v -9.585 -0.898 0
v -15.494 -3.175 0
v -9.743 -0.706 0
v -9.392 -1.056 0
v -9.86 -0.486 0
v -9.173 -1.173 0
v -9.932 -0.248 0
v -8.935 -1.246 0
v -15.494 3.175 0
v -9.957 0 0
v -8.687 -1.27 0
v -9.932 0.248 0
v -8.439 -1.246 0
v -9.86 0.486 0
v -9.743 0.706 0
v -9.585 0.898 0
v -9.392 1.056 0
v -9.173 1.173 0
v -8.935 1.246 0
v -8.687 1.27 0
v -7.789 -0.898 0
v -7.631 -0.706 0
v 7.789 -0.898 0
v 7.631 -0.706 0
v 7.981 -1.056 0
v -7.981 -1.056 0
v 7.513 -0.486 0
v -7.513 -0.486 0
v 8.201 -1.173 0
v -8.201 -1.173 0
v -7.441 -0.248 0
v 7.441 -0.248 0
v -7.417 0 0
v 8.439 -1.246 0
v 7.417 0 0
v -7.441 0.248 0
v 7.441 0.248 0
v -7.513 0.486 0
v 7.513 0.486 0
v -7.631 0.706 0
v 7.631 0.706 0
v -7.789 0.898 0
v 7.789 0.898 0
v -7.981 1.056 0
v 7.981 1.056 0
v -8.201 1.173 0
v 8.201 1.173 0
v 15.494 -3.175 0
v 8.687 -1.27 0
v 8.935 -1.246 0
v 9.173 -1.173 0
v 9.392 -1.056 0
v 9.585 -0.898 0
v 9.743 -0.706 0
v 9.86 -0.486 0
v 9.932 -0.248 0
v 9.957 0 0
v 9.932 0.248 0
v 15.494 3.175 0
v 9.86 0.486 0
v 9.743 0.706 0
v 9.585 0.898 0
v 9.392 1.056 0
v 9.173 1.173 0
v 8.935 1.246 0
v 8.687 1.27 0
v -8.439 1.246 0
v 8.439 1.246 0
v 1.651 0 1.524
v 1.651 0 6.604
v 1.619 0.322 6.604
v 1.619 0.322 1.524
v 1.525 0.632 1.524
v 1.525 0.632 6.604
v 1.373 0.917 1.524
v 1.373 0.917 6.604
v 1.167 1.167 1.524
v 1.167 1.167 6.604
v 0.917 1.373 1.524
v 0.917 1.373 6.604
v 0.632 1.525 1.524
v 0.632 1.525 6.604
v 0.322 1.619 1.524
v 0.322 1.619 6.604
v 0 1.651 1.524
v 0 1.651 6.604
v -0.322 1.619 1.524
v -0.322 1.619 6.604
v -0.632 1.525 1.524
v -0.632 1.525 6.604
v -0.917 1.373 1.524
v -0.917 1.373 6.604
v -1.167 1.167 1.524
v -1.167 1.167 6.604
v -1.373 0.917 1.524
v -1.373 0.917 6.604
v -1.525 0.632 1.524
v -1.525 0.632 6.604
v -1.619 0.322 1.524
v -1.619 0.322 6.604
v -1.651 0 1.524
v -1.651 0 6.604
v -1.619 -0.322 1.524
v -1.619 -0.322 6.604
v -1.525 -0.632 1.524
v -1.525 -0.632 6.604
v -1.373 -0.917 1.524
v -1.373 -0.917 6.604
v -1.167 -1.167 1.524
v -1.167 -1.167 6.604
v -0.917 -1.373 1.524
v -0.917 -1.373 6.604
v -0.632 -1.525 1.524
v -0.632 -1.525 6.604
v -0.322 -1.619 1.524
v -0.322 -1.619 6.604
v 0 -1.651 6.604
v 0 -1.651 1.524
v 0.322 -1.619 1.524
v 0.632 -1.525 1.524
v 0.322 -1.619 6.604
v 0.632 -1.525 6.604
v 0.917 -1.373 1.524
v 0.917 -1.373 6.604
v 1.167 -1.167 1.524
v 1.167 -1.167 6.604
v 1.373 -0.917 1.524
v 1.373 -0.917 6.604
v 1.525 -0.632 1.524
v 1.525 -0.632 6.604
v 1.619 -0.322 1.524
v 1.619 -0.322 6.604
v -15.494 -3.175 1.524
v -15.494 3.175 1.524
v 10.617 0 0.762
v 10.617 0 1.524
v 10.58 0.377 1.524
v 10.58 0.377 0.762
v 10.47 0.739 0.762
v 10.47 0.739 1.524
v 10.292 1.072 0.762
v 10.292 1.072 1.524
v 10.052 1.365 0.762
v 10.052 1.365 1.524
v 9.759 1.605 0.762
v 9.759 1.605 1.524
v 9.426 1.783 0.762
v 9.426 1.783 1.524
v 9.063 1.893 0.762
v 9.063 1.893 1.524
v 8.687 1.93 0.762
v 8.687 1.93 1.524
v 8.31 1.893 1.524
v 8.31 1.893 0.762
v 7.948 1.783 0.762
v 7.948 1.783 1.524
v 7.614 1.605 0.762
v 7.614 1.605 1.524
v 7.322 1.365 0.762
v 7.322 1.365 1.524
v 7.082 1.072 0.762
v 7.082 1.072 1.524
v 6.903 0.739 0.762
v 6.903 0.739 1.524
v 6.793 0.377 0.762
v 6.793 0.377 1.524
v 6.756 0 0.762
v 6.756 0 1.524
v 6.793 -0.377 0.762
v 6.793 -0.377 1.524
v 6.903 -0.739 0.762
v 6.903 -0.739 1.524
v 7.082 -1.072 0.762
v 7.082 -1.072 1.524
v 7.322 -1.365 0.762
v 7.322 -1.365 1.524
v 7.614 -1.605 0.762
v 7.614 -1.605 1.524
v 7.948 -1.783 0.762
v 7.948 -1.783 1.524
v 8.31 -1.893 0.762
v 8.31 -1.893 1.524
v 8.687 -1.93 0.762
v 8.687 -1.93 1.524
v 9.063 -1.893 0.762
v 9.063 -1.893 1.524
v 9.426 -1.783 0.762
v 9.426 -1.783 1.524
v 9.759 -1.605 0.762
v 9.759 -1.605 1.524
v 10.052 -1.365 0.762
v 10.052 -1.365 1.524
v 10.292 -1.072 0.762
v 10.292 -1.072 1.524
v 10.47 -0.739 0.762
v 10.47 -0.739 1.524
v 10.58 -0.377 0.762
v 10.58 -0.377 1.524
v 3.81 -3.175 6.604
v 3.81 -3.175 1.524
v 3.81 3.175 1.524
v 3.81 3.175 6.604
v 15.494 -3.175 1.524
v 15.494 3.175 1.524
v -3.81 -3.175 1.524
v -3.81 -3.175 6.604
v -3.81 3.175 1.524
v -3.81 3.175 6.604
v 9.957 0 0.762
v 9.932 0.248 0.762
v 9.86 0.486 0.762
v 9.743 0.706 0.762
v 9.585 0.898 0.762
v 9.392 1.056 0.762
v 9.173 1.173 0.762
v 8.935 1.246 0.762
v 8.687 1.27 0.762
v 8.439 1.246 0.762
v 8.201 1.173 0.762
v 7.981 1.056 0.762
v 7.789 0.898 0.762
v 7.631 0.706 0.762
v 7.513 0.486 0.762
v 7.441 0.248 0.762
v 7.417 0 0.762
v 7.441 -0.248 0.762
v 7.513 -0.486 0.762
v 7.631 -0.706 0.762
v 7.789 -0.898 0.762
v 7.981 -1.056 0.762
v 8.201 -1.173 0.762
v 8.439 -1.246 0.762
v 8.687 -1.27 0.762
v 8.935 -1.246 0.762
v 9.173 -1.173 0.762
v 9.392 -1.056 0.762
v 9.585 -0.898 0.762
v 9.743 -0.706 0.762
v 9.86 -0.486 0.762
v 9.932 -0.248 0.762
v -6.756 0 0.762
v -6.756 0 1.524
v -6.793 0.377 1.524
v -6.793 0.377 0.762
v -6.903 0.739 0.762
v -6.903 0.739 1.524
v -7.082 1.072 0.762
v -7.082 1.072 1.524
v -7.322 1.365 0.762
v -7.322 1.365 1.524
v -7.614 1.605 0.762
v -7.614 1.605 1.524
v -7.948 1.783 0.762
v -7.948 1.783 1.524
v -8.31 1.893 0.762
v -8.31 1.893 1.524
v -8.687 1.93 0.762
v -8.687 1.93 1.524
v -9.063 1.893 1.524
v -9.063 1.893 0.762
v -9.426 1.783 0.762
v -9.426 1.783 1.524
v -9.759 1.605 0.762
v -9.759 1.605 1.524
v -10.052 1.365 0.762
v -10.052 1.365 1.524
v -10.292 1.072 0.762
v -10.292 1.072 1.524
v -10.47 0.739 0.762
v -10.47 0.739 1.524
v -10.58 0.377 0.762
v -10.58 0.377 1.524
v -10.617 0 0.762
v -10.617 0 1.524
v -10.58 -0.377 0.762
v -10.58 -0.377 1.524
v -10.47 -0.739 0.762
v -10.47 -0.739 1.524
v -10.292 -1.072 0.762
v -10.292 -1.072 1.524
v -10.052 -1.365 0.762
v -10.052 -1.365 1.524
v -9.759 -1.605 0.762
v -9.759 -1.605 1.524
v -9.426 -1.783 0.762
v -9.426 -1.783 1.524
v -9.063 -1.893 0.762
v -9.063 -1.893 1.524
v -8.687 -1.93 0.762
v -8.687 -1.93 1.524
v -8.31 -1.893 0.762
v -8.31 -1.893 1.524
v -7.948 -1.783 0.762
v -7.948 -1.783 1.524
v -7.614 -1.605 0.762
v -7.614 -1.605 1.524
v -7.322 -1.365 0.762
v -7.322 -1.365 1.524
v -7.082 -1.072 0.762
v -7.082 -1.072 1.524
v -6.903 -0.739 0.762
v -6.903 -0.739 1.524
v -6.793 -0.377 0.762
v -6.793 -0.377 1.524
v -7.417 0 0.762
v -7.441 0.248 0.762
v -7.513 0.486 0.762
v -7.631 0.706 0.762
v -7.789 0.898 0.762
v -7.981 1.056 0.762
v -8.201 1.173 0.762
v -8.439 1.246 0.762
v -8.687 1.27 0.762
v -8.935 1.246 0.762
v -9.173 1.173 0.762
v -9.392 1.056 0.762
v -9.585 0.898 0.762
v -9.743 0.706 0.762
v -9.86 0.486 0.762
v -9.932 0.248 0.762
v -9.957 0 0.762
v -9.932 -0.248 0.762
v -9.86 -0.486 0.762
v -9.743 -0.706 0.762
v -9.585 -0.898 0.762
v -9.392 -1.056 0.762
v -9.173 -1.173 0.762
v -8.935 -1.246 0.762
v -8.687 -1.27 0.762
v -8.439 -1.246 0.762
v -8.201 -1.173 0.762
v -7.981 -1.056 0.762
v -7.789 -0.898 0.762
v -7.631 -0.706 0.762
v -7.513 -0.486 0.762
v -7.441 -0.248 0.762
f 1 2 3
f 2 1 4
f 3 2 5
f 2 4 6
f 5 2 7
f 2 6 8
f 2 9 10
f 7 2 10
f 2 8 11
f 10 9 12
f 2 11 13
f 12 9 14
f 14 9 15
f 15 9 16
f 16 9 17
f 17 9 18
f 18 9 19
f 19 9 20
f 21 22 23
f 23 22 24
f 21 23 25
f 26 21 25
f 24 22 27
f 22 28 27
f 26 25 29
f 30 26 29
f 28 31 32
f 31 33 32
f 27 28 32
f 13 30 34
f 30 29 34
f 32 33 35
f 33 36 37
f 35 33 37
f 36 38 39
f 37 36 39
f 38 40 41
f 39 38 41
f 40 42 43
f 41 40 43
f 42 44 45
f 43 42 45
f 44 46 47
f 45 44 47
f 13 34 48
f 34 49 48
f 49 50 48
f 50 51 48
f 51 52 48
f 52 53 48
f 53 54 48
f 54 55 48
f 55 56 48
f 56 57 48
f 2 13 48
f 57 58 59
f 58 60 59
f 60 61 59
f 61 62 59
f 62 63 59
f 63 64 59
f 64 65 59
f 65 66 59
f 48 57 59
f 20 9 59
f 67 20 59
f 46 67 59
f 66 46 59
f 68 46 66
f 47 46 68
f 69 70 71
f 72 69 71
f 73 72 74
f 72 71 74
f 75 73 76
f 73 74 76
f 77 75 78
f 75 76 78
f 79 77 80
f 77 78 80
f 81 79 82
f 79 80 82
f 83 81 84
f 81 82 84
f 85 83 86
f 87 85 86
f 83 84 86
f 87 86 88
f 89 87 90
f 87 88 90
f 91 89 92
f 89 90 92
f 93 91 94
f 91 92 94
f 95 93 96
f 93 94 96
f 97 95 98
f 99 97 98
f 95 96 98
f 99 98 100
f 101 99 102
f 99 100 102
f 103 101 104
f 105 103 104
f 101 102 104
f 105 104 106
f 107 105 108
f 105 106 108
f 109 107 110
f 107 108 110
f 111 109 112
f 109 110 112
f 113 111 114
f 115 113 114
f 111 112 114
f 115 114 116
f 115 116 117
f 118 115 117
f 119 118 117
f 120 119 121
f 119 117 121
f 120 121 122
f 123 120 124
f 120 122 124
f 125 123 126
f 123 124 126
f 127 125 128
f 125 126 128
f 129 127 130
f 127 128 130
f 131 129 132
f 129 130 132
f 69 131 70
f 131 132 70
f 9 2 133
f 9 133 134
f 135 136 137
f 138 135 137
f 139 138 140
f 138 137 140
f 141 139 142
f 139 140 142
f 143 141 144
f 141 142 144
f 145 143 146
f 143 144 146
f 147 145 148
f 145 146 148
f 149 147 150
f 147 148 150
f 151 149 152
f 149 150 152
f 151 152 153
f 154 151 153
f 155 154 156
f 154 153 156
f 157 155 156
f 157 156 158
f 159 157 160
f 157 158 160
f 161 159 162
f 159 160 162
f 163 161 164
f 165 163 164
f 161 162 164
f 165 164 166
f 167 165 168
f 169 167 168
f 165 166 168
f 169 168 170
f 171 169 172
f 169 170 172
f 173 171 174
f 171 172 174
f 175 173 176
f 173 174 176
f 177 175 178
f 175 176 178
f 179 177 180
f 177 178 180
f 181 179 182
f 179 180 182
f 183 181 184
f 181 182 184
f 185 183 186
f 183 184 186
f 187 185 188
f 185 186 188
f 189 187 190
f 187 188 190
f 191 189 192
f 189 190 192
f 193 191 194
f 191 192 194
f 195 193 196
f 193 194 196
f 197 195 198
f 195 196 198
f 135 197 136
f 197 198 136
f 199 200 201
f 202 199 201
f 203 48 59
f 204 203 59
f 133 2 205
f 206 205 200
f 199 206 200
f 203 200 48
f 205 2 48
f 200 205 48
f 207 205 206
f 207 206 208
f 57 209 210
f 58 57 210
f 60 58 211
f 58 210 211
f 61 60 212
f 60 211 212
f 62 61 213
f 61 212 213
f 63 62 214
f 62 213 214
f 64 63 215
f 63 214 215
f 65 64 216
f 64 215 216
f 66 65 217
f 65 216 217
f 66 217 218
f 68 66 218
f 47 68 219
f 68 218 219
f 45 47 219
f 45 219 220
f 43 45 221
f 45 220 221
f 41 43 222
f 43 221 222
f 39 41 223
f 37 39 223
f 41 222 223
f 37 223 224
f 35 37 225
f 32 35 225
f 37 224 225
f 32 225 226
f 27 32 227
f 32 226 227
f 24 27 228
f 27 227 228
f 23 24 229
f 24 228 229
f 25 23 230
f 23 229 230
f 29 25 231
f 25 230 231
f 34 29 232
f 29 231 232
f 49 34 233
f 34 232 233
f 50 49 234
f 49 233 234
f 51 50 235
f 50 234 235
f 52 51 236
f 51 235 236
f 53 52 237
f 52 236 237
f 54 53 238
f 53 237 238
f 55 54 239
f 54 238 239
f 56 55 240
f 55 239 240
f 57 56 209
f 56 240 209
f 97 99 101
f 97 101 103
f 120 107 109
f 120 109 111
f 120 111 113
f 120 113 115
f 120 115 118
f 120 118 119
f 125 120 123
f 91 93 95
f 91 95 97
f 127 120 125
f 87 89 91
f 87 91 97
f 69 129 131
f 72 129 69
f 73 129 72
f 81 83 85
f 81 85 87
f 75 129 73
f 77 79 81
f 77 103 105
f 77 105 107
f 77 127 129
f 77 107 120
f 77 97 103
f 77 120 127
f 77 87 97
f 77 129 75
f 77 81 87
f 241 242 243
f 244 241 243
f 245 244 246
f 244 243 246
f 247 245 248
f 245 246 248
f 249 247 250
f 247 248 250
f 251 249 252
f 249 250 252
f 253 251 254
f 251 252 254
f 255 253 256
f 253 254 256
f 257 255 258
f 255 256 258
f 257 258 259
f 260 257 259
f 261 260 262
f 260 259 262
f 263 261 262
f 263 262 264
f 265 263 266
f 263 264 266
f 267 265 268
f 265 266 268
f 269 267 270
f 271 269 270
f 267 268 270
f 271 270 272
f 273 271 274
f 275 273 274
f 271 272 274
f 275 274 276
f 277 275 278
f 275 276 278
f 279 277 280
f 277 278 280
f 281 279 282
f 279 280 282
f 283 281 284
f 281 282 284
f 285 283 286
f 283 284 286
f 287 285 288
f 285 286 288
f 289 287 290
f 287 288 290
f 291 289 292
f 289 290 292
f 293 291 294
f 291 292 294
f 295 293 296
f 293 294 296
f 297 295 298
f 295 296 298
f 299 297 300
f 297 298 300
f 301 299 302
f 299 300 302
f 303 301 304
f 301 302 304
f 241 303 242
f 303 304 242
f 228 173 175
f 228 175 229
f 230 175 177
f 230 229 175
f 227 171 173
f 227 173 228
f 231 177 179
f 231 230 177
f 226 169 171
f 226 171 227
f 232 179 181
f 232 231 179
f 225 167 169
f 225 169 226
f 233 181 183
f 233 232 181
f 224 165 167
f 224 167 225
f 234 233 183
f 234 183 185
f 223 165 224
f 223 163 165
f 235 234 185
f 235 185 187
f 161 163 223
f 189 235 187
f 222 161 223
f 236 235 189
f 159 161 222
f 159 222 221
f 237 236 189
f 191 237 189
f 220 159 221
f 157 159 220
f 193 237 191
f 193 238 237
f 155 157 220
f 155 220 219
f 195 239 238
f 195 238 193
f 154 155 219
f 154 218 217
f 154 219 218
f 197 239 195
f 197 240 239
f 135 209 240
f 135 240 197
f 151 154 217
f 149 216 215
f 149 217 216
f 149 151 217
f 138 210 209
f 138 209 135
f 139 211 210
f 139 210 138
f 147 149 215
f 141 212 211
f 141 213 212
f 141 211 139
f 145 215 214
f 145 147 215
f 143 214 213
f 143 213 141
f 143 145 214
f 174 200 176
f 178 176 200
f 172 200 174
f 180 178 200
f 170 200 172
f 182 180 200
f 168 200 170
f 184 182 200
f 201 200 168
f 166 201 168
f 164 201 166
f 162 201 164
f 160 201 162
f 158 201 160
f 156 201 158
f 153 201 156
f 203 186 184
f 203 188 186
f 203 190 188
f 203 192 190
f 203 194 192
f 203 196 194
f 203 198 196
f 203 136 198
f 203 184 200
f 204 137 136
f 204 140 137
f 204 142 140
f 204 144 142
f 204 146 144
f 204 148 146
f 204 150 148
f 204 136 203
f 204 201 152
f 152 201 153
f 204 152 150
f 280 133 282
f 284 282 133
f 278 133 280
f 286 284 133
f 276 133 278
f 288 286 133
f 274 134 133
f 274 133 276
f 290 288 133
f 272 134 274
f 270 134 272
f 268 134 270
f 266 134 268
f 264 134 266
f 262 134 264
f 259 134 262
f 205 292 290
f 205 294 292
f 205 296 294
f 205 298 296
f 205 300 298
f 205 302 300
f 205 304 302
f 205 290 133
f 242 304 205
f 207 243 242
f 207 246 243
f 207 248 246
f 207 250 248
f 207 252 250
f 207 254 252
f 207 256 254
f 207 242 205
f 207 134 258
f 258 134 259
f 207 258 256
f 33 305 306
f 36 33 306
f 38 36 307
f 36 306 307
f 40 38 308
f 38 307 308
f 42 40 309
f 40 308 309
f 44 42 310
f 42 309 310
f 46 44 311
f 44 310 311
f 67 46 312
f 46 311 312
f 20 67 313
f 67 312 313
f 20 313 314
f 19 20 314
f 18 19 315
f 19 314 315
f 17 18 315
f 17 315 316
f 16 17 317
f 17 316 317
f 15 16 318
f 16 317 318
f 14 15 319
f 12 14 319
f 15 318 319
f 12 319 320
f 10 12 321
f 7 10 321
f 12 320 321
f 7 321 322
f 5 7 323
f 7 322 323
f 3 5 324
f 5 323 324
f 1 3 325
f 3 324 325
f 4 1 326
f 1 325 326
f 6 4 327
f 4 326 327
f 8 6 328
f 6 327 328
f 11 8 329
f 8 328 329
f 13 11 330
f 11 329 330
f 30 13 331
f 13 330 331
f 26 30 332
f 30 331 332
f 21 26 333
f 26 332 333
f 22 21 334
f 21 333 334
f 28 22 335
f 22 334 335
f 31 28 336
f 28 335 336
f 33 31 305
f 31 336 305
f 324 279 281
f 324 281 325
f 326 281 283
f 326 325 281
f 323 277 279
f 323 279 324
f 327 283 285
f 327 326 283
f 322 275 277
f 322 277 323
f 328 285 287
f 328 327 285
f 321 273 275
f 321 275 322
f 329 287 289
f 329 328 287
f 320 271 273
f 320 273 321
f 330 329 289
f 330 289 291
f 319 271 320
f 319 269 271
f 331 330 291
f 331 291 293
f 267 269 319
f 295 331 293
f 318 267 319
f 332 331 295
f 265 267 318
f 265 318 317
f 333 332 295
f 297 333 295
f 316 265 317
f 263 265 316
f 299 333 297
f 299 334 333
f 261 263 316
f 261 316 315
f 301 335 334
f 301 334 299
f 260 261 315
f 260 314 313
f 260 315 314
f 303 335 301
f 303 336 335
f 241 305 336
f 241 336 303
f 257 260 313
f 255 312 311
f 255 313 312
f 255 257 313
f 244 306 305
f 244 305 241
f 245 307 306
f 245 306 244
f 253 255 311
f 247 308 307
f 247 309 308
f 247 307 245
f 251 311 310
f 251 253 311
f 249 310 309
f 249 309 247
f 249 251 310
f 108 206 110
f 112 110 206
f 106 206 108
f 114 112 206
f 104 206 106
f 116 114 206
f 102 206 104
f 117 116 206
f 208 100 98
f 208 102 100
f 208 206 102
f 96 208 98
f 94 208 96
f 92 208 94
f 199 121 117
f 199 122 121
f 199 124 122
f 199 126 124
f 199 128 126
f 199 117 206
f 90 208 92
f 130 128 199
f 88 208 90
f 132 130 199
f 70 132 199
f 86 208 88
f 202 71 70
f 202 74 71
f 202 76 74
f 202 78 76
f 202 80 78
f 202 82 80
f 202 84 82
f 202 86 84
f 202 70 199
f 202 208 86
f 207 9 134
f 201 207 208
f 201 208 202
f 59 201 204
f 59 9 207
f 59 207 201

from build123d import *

# Parameters (mm, degrees)
F0_W     = 30.988
F0_H     = 6.35
F1_DEPTH = 1.524
F2_R     = 1.9304
F3_DEPTH = 0.762
F4_R     = 1.27
F5_DEPTH = 0.762
F6_W     = 7.62
F6_H     = 6.35
F7_DEPTH = 5.08
F8_R     = 1.651
F9_DEPTH = 5.08


with BuildPart() as f1:
    # F0 (on Top) → F1 (new body)
    with BuildSketch(Plane.XY):
        Rectangle(F0_W, F0_H)
    extrude(amount=F1_DEPTH)

    # F2 (on face) → F3 (cut)
    with BuildSketch(Plane.XY.offset(1.524)):
        with Locations((-8.6868, 0)):
            Circle(F2_R)
        with Locations((8.6868, 0)):
            Circle(F2_R)
    extrude(amount=-F3_DEPTH, mode=Mode.SUBTRACT)

    # F4 (on face) → F5 (cut)
    with BuildSketch(Plane.XY.offset(0.762)):
        with Locations((-8.6868, 0)):
            Circle(F4_R)
        with Locations((8.6868, 0)):
            Circle(F4_R)
    extrude(amount=-F5_DEPTH, mode=Mode.SUBTRACT)

    # F6 (on face) → F7 (join)
    with BuildSketch(Plane.XY.offset(1.524)):
        Rectangle(F6_W, F6_H)
    extrude(amount=F7_DEPTH)

    # F8 (on face) → F9 (cut)
    with BuildSketch(Plane.XY.offset(6.604)):
        Circle(F8_R)
    extrude(amount=-F9_DEPTH, mode=Mode.SUBTRACT)


solid = f1.part
